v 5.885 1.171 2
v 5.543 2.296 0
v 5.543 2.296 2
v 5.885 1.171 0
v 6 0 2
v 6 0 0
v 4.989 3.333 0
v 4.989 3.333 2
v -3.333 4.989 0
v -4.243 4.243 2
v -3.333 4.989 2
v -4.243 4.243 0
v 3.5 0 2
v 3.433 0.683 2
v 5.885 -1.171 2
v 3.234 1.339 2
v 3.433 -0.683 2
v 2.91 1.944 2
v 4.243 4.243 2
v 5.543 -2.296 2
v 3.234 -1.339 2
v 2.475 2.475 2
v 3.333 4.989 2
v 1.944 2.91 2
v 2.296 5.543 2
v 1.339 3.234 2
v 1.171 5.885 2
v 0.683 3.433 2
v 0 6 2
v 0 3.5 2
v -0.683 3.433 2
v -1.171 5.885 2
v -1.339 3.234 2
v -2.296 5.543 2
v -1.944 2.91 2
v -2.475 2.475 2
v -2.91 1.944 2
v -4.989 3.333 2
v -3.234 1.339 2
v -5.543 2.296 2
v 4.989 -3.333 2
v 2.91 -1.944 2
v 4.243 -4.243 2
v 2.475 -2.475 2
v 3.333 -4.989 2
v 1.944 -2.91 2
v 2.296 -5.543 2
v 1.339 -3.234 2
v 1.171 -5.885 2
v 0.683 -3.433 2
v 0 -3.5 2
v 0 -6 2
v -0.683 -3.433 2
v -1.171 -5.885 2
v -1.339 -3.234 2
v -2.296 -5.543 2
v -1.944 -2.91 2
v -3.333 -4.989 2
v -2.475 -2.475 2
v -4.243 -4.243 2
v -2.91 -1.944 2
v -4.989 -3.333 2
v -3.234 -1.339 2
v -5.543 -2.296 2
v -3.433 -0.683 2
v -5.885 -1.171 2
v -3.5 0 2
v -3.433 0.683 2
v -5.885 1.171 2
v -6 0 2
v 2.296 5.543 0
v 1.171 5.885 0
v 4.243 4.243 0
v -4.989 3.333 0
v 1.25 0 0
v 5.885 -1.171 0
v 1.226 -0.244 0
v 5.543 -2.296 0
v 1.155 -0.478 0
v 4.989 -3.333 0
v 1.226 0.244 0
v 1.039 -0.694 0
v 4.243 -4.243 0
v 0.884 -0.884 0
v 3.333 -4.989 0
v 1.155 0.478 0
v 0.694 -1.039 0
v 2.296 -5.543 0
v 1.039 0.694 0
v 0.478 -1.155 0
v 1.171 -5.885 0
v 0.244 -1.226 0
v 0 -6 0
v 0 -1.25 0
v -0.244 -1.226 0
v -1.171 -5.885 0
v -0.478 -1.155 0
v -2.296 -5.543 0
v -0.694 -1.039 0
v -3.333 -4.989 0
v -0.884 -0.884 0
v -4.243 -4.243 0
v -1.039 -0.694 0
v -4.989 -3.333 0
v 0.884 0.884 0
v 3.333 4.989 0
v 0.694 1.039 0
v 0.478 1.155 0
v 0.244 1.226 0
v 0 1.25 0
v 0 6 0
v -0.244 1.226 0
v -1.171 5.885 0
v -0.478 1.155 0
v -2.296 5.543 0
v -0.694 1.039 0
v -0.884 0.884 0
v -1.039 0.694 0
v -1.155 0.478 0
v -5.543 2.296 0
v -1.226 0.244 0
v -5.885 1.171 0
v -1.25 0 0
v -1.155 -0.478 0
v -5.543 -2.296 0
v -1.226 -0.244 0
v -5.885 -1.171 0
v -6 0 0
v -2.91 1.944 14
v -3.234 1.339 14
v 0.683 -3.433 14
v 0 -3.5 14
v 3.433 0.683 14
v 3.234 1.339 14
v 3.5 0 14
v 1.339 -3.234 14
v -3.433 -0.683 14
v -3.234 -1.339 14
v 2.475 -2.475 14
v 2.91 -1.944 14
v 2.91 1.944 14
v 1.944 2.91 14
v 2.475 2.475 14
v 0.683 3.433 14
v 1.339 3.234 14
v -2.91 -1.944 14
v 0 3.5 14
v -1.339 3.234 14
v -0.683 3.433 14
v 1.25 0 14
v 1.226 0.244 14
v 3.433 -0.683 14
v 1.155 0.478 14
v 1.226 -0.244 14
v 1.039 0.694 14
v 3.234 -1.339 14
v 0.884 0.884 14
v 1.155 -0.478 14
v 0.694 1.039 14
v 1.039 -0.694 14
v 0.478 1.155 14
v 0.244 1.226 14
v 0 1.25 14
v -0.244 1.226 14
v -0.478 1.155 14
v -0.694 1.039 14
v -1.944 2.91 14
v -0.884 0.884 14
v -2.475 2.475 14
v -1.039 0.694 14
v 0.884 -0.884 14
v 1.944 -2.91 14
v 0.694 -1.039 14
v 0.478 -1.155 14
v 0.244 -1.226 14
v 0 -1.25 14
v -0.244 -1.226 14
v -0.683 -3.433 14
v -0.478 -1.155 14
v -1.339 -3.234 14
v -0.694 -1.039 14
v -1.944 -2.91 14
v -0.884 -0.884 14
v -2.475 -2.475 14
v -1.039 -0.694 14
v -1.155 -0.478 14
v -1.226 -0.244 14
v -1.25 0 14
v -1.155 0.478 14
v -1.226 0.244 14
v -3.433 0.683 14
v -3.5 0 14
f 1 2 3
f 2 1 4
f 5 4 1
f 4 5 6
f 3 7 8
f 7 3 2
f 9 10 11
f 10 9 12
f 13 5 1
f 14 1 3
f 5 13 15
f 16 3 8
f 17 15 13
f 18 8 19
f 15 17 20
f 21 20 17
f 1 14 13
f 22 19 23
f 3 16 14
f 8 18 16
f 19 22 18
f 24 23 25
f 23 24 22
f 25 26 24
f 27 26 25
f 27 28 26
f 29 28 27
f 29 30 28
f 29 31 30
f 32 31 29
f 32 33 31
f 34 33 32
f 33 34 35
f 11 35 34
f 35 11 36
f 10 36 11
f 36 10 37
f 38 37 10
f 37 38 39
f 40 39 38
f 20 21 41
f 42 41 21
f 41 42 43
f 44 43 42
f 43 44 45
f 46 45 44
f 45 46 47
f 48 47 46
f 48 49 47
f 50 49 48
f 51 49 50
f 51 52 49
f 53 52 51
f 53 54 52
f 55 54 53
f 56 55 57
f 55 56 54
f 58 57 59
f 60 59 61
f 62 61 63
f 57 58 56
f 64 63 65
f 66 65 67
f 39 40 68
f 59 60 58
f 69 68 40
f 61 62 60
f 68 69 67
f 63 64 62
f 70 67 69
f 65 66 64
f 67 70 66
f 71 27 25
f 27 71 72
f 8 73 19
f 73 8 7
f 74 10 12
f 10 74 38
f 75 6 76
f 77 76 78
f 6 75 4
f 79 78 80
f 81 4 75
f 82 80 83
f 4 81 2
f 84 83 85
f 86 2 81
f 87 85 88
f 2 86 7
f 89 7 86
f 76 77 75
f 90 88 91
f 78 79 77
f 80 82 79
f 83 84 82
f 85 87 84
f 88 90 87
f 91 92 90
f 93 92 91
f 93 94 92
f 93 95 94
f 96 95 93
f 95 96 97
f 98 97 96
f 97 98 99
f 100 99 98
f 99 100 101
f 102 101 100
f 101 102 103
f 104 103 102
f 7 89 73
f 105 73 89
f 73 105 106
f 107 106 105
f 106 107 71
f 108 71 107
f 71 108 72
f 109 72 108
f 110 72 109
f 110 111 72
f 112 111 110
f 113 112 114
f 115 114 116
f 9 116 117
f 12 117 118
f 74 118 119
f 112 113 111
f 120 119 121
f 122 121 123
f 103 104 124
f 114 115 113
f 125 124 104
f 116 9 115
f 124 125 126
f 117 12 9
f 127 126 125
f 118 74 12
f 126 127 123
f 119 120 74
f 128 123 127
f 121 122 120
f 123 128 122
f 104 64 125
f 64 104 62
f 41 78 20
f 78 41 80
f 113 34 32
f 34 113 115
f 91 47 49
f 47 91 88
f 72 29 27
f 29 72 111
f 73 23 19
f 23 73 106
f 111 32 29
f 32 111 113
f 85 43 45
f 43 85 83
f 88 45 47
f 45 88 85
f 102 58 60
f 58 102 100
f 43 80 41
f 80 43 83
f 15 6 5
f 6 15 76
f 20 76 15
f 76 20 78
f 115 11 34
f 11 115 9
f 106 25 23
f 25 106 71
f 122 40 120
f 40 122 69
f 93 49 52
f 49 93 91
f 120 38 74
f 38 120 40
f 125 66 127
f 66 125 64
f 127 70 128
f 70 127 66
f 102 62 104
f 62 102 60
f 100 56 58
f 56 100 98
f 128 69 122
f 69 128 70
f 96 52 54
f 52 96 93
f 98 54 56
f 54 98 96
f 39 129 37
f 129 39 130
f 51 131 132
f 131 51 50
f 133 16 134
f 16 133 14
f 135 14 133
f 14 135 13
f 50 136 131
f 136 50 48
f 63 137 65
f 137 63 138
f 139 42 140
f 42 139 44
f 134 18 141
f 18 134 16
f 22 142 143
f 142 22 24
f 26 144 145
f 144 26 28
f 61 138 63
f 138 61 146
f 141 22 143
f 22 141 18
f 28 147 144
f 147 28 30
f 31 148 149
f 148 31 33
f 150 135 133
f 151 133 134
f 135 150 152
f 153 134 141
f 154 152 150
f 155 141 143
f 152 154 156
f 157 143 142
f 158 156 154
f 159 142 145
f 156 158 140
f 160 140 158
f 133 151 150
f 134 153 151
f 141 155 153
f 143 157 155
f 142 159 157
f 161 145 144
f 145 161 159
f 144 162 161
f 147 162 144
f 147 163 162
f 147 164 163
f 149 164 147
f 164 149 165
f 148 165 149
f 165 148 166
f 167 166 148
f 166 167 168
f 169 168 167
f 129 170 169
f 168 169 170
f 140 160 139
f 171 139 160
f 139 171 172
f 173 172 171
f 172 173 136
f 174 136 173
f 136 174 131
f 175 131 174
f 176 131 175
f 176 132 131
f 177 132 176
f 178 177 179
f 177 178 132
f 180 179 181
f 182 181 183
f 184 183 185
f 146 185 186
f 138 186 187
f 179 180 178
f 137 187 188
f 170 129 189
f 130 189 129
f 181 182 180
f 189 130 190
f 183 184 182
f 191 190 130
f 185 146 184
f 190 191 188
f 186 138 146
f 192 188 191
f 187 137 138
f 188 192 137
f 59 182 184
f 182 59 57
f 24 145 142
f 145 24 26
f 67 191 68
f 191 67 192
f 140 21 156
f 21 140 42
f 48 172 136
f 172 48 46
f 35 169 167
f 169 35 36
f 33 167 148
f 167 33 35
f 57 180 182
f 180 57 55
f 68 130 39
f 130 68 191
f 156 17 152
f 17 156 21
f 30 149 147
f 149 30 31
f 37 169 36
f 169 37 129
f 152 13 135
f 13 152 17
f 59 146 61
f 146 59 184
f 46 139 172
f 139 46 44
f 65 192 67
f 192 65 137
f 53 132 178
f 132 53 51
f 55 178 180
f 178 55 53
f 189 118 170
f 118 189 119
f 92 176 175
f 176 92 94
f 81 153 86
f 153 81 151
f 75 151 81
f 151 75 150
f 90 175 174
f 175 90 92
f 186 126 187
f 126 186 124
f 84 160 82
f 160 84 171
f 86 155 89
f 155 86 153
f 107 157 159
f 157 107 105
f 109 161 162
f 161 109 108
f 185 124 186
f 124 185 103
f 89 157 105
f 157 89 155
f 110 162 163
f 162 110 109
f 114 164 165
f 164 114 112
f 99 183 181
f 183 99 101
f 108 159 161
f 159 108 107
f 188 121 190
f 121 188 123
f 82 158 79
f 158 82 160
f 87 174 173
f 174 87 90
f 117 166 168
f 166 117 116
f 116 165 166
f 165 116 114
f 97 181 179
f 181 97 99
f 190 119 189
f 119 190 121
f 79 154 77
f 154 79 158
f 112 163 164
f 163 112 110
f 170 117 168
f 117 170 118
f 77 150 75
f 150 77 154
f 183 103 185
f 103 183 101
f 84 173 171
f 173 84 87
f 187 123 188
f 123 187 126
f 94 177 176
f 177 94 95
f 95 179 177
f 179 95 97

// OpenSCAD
$fn = 32;

// ----------------------------------------------------------------------
// Micro post: flanged post, 5-20 mm class
// ----------------------------------------------------------------------

// --- parameters (mm) ---
post_d = 7;               // post diameter
post_h = 12;              // post height above the flange
flange_d = 12;            // flange diameter
flange_t = 2;             // flange thickness
bore_d = 2.5;             // through bore

total_h = post_h + flange_t;  // overall height

difference() {
  union() {
    cylinder(h = flange_t, d = flange_d);
    translate([0, 0, flange_t]) cylinder(h = post_h, d = post_d);
  }
  translate([0, 0, -1]) cylinder(h = total_h + 2, d = bore_d);
}
